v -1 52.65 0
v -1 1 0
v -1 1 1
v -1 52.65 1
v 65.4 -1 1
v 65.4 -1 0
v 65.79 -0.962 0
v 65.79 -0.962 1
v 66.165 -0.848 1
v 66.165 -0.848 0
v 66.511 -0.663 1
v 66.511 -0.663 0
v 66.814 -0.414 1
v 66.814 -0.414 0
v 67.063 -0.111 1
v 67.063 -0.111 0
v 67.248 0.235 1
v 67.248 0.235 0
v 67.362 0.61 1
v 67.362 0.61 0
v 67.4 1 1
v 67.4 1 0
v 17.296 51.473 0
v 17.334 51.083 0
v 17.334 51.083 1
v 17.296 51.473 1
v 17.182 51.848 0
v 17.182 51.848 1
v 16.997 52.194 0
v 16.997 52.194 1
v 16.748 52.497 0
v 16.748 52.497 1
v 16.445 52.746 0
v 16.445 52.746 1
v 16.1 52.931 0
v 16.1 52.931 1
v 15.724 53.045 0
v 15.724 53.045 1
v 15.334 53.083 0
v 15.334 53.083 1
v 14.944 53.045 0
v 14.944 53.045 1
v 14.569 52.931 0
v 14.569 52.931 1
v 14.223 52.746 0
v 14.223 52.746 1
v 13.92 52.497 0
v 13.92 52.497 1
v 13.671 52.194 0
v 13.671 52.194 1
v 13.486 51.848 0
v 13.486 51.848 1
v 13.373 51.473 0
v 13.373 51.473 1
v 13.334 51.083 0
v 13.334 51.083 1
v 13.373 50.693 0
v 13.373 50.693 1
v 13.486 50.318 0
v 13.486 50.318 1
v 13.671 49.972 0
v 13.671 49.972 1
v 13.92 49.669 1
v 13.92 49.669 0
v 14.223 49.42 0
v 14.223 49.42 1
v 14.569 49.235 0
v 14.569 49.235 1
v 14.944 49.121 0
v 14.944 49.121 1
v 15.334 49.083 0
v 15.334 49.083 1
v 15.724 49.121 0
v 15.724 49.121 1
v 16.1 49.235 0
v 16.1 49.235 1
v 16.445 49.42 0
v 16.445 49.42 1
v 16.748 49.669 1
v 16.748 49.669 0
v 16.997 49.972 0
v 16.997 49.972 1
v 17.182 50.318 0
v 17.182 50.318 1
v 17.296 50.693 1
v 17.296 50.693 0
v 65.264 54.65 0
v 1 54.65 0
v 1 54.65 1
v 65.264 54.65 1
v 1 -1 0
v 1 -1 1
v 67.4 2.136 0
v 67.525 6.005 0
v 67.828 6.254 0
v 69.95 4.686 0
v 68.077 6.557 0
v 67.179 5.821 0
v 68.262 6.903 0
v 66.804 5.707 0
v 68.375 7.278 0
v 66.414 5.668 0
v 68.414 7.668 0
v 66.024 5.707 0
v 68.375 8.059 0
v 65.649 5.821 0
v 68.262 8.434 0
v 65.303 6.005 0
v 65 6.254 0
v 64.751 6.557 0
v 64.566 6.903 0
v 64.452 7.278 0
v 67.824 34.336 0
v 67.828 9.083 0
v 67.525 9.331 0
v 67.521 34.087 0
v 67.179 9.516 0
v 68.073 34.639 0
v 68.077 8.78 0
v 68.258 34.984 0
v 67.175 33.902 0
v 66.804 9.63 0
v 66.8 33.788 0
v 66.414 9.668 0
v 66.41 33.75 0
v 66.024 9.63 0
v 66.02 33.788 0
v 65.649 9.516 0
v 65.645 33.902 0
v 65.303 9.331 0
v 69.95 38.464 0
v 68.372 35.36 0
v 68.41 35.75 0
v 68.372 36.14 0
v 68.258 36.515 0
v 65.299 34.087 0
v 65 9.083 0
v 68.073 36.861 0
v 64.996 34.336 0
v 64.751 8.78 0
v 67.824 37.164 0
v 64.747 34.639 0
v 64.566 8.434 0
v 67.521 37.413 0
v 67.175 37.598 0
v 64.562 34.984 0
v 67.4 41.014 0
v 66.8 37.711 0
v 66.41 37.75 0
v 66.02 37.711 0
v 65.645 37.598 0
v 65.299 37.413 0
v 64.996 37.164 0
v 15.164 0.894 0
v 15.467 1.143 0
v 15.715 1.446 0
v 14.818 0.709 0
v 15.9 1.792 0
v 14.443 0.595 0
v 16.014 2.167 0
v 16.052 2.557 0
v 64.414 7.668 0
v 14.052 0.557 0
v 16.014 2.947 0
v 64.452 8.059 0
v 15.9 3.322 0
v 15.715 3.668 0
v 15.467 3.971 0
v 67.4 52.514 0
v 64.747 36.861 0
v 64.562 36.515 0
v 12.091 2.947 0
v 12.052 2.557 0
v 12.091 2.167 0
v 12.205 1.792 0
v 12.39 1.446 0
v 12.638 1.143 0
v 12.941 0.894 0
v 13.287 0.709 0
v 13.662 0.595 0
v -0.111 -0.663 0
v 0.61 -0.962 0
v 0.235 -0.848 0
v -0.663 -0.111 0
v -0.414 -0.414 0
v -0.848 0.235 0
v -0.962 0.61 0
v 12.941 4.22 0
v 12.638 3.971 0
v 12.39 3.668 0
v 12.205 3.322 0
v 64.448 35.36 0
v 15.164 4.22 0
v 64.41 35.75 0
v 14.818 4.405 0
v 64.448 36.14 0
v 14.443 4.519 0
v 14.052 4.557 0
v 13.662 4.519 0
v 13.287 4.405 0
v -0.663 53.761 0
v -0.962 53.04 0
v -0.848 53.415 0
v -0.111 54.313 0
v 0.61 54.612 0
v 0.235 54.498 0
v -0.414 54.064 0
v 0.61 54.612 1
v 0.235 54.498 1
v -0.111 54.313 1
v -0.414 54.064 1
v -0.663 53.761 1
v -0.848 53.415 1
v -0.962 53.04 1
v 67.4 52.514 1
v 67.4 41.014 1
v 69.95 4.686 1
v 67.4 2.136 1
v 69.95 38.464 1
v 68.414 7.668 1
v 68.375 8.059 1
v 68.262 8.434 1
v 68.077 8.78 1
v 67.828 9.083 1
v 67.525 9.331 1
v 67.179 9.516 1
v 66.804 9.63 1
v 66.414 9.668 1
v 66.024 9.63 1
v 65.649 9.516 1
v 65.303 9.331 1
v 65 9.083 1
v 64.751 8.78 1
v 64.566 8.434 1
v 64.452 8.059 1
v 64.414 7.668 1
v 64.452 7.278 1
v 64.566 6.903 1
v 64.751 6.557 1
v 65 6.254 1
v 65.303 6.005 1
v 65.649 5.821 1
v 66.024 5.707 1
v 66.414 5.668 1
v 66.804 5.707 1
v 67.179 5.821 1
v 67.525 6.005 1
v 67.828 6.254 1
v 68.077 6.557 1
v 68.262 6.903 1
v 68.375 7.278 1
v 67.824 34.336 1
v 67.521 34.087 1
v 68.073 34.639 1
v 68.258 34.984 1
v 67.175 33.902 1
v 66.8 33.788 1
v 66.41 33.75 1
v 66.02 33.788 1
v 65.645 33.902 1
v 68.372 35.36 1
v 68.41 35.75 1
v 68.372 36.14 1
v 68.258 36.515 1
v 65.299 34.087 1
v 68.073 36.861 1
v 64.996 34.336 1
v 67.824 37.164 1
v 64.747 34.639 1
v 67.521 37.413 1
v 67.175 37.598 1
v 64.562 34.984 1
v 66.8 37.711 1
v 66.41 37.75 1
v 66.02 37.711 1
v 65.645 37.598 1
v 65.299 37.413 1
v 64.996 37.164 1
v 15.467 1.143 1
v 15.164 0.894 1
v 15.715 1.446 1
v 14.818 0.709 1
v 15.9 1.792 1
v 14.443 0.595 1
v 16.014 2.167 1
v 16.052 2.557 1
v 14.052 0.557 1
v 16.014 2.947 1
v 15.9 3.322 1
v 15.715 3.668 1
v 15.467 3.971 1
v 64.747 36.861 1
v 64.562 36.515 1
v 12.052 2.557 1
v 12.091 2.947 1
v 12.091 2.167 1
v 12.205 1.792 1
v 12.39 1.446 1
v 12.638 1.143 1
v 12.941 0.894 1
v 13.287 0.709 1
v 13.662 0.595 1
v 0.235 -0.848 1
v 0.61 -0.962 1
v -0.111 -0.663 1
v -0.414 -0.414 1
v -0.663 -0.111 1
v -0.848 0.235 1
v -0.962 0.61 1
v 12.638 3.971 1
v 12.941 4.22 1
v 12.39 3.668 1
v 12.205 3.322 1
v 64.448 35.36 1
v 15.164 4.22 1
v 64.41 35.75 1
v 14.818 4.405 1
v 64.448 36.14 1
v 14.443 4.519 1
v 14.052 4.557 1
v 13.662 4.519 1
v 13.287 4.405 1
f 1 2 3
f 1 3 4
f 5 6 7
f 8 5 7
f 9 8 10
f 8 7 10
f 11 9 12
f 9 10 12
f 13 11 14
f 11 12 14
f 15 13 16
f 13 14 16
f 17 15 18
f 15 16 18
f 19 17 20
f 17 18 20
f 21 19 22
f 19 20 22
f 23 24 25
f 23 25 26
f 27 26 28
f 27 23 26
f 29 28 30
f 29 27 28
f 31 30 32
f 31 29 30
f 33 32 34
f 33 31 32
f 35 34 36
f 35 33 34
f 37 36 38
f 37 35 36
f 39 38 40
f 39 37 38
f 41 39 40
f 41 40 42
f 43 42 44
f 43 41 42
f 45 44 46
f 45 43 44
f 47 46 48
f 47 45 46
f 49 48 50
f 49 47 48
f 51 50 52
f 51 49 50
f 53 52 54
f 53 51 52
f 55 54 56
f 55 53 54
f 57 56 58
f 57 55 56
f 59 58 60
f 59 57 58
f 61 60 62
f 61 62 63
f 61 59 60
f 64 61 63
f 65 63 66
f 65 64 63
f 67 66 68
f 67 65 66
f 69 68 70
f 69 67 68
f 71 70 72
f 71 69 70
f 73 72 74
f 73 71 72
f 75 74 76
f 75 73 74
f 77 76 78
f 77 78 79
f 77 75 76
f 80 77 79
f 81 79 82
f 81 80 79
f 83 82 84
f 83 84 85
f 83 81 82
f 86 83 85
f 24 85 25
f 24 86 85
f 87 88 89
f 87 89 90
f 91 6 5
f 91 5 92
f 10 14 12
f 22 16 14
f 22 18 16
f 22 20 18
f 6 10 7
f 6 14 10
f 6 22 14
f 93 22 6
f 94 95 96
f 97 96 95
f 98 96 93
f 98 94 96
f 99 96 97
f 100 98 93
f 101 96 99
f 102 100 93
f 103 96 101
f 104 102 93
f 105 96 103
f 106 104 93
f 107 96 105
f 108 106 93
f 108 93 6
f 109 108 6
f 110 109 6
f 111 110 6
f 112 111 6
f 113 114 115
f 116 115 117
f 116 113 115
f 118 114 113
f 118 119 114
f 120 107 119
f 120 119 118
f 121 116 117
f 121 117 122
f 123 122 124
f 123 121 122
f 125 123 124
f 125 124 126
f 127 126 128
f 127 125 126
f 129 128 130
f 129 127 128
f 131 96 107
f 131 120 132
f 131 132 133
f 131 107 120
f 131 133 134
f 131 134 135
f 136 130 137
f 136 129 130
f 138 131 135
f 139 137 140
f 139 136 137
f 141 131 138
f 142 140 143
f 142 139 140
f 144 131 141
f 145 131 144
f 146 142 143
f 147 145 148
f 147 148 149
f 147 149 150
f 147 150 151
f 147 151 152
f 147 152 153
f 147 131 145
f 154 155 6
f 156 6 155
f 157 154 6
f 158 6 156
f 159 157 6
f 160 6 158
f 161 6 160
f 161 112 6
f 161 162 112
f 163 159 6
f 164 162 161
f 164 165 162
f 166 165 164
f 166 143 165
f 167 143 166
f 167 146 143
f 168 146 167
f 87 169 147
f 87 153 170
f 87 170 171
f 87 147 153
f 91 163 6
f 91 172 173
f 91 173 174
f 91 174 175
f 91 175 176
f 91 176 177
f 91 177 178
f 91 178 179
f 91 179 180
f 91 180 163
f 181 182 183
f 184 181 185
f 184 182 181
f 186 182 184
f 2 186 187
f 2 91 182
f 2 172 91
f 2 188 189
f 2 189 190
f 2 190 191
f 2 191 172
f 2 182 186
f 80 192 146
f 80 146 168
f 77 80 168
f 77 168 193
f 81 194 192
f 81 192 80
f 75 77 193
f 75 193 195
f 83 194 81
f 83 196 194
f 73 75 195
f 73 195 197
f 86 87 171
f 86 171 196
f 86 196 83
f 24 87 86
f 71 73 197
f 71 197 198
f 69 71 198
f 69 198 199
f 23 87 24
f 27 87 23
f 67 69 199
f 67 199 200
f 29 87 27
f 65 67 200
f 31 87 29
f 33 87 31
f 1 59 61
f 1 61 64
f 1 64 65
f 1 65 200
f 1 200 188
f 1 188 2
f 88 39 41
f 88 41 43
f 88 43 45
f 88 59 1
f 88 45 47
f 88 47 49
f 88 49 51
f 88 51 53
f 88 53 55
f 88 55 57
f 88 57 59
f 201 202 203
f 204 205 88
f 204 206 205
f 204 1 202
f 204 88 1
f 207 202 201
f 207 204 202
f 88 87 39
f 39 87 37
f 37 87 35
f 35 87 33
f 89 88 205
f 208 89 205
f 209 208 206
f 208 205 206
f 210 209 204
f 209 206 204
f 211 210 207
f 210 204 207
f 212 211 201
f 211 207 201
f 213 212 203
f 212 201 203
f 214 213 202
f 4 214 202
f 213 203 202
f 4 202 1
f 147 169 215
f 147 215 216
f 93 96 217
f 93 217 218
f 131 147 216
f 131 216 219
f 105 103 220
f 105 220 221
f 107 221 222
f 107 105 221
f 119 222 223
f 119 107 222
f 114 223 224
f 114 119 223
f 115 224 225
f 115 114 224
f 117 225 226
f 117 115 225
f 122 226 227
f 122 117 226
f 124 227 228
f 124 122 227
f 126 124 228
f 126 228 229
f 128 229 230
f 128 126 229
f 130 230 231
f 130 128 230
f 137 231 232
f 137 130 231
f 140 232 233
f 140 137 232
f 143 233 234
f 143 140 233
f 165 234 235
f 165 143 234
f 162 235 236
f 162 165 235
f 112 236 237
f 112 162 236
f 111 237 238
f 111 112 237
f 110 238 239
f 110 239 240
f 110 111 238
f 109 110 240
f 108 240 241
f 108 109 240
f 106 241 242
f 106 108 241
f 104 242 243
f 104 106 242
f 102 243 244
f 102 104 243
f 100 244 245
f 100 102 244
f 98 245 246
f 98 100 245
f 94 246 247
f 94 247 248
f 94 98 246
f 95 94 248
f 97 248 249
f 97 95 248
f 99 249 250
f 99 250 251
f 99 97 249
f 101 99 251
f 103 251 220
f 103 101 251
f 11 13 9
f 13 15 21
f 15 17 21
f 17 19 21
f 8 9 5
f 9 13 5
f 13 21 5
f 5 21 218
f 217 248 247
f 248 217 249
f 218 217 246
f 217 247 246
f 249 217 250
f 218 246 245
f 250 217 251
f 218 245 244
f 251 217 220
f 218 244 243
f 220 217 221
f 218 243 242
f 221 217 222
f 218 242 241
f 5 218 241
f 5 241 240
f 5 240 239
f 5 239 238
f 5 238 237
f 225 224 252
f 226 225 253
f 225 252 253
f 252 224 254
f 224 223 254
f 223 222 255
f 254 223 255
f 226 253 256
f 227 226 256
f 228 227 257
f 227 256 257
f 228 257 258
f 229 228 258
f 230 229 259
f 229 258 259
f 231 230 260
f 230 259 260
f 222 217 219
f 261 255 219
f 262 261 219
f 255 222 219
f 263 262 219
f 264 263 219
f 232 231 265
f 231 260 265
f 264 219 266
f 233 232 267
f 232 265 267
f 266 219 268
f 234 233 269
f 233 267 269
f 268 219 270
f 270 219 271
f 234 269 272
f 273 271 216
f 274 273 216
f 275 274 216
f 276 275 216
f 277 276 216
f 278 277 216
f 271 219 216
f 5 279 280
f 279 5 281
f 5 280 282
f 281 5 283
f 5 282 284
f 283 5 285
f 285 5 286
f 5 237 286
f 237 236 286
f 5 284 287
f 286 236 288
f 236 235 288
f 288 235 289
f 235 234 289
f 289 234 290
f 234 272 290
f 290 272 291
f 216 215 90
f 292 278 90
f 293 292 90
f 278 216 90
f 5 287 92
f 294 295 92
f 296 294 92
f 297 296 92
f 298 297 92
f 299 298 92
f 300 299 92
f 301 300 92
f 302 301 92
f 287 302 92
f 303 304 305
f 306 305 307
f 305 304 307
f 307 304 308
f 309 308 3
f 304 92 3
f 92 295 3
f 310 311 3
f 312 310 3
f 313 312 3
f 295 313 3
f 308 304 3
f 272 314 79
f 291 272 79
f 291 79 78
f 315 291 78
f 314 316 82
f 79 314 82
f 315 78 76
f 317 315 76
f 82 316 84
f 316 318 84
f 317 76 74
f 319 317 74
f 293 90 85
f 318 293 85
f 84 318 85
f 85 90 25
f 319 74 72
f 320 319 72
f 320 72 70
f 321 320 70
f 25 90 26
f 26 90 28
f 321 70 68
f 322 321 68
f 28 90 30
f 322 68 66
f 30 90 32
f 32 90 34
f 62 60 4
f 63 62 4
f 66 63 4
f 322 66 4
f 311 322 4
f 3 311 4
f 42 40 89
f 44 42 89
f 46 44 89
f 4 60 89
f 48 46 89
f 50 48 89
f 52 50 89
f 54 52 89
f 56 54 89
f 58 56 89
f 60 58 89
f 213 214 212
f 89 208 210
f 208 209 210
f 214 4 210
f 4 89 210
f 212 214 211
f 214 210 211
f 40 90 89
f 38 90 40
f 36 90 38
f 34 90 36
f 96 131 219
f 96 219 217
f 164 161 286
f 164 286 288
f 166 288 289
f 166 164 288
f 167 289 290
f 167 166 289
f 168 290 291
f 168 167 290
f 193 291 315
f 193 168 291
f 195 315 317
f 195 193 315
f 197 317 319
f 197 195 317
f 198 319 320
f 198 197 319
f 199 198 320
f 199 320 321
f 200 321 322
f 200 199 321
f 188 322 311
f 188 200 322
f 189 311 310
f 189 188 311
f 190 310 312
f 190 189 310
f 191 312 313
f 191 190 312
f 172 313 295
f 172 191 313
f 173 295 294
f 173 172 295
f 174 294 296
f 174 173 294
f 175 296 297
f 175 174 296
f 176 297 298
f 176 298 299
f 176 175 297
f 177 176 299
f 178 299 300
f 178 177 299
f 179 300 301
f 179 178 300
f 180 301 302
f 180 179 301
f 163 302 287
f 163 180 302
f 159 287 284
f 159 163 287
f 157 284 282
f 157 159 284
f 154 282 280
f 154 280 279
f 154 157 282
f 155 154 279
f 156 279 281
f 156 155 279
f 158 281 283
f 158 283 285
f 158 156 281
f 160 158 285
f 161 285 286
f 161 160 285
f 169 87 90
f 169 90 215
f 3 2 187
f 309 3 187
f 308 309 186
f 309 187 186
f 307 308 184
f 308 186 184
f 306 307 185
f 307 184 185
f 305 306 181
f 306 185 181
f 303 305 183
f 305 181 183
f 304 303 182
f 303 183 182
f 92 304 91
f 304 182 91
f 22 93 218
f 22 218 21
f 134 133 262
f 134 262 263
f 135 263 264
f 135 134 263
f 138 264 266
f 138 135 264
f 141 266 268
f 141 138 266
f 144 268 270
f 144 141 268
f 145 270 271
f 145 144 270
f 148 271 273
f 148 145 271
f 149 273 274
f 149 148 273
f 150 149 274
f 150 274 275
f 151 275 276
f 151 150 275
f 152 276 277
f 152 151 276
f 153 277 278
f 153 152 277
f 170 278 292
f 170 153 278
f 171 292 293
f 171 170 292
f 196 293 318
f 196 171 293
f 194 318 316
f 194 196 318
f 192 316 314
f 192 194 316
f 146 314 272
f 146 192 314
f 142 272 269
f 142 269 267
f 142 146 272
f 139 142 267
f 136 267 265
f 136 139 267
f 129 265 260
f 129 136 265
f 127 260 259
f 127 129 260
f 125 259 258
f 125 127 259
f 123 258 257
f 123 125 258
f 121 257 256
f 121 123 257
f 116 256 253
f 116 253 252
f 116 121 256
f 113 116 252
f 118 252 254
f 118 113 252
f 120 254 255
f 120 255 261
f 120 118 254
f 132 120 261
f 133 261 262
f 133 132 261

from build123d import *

# Parameters (mm, degrees)
SKETCH_R      = 2
EXTRUDE_DEPTH = 1


with BuildPart() as part:
    # Sketch → Extrude (new body)
    with BuildSketch(Plane.XY):
        with BuildLine():
            Line((1, 54.65), (65.264214, 54.65))
            Line((65.264214, 54.65), (67.4, 52.514214))
            Line((67.4, 52.514214), (67.4, 41.014214))
            Line((67.4, 41.014214), (69.95, 38.464214))
            Line((69.95, 38.464214), (69.95, 4.685786))
            Line((69.95, 4.685786), (67.4, 2.135786))
            Line((67.4, 2.135786), (67.4, 1))
            ThreePointArc((65.4, -1), (66.814214, -0.414214), (67.4, 1))
            Line((65.4, -1), (1, -1))
            ThreePointArc((-1, 1), (-0.414214, -0.414214), (1, -1))
            Line((-1, 1), (-1, 52.65))
            ThreePointArc((1, 54.65), (-0.414214, 54.064214), (-1, 52.65))
        make_face()
        with Locations((15.334135, 51.082933)):
            Circle(SKETCH_R, mode=Mode.SUBTRACT)
        with Locations((66.409951, 35.749834)):
            Circle(SKETCH_R, mode=Mode.SUBTRACT)
        with Locations((66.413926, 7.668398)):
            Circle(SKETCH_R, mode=Mode.SUBTRACT)
        with Locations((14.05247, 2.556984)):
            Circle(SKETCH_R, mode=Mode.SUBTRACT)
    extrude(amount=EXTRUDE_DEPTH)


solid = part.part
